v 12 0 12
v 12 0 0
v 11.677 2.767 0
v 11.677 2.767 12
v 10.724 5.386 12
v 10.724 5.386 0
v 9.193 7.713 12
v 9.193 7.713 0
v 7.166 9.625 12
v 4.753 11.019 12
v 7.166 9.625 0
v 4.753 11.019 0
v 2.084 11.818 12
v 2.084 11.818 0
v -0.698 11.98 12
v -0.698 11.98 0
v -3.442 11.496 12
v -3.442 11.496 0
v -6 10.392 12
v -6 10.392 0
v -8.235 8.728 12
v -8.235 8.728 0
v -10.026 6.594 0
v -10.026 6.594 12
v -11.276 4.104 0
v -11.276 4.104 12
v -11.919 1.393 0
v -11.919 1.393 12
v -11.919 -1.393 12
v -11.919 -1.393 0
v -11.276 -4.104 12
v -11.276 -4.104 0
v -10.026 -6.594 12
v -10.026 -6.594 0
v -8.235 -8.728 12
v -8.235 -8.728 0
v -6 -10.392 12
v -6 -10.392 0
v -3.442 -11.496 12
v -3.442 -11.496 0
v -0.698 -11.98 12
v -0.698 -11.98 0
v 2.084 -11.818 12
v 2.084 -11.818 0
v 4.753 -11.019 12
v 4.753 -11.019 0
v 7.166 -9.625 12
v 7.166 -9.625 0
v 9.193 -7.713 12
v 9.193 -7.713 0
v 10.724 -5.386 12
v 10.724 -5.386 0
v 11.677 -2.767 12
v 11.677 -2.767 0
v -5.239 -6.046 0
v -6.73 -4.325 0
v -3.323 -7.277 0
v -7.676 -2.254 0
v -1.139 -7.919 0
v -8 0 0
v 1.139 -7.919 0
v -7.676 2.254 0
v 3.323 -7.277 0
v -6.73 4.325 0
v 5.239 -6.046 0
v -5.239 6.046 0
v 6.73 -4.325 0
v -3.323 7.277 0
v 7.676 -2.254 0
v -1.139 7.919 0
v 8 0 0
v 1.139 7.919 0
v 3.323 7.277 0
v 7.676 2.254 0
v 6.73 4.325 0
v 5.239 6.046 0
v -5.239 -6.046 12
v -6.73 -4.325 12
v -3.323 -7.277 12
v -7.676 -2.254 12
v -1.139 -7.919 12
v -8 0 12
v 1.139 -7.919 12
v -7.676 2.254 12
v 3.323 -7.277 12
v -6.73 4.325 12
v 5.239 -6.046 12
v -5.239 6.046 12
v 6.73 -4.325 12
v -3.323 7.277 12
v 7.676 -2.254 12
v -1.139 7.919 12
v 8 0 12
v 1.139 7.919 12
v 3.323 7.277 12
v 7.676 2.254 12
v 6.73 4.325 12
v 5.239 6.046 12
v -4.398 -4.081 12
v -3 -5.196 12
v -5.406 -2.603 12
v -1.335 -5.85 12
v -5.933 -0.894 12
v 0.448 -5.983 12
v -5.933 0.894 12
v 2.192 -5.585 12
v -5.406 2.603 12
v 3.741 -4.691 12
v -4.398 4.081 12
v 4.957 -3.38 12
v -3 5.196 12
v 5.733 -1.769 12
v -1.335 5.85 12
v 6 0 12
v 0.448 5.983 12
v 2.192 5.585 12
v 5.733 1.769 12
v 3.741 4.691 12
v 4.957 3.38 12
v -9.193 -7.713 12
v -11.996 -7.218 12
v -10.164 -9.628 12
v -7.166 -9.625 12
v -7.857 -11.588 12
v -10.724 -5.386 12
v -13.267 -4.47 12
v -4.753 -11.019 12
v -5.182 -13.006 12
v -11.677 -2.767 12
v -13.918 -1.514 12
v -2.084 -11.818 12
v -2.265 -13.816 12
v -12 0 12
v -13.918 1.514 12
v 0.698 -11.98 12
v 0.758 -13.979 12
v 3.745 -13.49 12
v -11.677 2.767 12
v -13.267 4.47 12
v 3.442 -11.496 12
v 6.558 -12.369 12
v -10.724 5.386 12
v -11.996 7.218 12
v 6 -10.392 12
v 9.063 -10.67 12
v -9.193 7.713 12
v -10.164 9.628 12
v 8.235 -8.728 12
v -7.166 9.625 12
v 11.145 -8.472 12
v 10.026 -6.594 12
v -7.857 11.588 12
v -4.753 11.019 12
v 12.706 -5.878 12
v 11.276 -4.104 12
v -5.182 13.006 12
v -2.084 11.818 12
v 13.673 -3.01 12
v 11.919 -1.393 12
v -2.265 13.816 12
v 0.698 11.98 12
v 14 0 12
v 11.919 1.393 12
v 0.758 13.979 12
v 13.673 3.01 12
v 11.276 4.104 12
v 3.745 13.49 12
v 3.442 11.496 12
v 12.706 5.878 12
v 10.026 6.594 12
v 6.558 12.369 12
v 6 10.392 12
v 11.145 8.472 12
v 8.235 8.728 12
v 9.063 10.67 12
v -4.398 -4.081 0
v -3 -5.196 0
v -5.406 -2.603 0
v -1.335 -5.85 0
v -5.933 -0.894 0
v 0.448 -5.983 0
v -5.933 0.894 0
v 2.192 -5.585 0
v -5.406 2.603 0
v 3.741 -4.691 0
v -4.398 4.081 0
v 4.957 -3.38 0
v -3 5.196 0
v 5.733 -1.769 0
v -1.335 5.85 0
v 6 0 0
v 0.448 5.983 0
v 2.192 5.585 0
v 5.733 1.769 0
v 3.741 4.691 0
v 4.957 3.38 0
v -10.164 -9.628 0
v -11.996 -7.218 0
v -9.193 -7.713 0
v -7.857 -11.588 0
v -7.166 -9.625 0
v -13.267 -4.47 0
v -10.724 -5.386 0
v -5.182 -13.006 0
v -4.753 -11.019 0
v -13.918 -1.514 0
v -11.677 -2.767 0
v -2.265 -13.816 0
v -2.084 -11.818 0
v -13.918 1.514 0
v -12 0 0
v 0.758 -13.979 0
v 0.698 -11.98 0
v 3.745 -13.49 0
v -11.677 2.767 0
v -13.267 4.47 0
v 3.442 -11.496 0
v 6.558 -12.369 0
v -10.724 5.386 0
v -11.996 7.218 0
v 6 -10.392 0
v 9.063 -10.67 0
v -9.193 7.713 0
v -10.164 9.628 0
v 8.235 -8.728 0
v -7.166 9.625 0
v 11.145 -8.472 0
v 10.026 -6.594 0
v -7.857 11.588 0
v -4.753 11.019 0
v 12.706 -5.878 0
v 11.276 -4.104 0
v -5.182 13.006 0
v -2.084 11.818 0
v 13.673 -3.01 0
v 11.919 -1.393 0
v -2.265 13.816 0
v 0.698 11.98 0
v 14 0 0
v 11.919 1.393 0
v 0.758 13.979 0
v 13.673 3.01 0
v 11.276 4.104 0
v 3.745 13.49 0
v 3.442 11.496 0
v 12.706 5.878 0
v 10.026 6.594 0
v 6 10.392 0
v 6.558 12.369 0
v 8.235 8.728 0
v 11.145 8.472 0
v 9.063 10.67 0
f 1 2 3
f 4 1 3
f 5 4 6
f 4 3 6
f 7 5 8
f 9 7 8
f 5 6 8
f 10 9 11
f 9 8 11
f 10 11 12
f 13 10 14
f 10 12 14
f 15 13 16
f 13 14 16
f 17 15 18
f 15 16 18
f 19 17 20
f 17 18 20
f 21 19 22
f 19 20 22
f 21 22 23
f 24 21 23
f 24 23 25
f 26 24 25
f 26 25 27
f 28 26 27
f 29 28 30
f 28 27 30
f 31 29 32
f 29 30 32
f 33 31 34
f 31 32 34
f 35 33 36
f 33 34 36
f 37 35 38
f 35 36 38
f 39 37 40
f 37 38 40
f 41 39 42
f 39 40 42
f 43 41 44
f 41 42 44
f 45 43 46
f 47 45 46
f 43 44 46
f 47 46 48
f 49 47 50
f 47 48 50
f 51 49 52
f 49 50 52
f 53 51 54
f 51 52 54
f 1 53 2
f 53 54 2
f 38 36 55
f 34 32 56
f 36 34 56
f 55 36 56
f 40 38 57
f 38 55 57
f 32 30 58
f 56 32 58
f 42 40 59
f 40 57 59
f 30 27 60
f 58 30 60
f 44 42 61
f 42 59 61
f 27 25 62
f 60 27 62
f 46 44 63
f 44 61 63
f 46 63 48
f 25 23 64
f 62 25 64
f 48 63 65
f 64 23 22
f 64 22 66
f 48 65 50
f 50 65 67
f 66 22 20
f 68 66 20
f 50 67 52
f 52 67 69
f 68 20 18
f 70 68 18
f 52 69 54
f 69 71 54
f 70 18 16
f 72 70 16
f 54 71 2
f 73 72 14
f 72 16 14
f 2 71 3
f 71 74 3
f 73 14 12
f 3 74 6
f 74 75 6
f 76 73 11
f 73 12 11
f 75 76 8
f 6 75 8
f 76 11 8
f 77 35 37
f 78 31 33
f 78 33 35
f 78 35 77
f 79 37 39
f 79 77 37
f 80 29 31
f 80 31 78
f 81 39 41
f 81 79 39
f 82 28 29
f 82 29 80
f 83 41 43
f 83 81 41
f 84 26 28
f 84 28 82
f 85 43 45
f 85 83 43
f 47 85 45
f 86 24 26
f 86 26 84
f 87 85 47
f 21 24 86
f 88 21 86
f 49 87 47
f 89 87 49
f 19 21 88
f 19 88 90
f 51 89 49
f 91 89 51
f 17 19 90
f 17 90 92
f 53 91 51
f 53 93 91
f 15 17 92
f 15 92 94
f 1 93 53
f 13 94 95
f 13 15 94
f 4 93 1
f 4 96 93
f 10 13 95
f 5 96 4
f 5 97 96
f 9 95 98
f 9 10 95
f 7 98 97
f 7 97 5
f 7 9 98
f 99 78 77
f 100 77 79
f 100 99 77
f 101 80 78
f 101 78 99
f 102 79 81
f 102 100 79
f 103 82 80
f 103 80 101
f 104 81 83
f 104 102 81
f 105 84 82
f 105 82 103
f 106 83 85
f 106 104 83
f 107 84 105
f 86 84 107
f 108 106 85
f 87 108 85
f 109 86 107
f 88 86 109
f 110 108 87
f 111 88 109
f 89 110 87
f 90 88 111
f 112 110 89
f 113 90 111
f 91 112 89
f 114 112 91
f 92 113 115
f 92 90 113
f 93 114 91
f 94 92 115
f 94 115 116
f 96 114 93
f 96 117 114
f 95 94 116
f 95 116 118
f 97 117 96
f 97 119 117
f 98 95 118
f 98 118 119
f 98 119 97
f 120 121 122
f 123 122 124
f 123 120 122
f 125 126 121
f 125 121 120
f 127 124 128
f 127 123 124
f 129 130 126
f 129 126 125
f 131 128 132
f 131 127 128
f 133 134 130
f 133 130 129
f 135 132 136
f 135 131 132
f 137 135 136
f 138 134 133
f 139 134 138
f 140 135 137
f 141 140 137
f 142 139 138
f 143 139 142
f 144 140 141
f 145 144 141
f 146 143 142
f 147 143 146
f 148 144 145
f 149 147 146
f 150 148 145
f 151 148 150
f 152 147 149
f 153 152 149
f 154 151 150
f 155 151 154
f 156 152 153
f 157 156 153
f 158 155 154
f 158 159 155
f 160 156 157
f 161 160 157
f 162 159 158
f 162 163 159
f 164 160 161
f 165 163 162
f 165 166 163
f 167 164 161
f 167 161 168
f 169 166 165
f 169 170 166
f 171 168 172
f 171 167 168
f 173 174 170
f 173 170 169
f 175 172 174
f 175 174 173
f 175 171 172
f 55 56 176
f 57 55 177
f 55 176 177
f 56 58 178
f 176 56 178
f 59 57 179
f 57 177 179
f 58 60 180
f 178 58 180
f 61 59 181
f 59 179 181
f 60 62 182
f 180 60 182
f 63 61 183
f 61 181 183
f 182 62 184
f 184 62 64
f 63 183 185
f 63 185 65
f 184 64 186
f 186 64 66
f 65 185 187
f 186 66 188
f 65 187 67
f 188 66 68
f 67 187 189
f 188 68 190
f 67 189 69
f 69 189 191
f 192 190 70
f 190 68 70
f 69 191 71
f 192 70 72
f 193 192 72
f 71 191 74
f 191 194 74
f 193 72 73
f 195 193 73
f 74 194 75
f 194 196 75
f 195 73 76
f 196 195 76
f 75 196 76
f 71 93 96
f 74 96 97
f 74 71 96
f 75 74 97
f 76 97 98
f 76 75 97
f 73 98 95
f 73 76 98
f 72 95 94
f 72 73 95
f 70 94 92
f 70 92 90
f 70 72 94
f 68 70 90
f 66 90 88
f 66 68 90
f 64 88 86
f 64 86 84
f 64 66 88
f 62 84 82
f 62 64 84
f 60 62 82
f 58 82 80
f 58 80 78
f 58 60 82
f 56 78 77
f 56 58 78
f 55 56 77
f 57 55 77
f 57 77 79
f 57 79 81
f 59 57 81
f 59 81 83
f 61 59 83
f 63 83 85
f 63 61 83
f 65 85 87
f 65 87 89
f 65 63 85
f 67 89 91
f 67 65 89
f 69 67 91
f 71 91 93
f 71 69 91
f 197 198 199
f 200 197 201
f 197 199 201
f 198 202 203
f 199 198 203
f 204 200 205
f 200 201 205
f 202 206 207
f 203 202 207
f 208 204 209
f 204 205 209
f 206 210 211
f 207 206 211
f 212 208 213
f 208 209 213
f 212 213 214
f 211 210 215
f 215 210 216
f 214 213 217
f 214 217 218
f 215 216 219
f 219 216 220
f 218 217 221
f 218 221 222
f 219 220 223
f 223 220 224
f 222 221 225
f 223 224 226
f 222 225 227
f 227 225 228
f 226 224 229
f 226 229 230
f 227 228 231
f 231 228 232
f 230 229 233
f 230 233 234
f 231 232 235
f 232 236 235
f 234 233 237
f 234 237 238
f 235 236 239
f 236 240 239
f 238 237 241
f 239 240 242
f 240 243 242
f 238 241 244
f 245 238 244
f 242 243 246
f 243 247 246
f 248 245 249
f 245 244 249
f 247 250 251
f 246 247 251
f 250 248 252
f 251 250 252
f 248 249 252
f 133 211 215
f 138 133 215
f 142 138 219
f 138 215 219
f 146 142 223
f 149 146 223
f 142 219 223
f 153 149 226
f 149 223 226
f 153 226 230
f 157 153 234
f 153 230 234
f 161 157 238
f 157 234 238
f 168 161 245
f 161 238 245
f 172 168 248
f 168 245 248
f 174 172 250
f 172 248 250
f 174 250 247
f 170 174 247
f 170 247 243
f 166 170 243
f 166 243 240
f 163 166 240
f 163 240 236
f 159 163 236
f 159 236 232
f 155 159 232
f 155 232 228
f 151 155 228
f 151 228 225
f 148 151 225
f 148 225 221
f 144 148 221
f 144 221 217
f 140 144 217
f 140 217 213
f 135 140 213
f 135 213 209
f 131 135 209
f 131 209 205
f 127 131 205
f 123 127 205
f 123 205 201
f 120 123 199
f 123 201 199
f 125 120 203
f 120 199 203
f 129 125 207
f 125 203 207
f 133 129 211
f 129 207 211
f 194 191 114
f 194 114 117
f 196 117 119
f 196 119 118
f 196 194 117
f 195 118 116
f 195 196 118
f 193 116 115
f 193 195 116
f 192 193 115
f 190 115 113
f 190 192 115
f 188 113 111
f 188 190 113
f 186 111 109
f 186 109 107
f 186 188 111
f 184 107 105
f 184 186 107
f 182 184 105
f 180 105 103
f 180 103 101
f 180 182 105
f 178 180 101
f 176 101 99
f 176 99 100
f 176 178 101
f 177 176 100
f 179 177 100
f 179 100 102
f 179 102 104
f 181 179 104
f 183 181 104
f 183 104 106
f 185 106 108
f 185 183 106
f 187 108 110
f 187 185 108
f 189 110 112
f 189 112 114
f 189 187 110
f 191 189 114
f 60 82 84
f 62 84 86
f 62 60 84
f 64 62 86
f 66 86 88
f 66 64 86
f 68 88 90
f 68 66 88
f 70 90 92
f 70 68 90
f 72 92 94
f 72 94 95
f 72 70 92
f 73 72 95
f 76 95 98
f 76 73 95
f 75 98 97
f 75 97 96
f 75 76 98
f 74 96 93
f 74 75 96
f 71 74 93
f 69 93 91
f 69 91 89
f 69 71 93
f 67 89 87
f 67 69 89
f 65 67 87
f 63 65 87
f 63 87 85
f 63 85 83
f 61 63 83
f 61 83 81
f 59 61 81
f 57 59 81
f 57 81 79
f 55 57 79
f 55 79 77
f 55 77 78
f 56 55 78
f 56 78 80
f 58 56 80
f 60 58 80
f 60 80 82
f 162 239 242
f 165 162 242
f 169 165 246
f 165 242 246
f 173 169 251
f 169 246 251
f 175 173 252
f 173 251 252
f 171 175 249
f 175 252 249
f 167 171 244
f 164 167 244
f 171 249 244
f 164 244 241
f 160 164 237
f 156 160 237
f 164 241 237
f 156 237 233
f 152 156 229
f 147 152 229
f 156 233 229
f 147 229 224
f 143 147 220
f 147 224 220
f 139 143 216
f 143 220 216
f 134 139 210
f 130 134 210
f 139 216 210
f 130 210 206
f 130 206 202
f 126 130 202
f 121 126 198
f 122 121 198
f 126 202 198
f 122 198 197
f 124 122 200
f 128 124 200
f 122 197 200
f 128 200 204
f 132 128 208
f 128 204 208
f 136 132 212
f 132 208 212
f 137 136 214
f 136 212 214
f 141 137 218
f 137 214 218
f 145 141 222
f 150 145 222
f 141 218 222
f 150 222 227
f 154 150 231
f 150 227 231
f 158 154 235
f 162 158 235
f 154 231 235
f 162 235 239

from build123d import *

# Parameters (mm, degrees)
SKIZZE1_R                       = 14
SKIZZE1_R_2                     = 6
AUFSATZ_LINEAR_AUSTRAGEN1_DEPTH = 12
SKIZZE2_R                       = 12
SKIZZE2_R_2                     = 8
SCHNITT_LINEAR_AUSTRAGEN2_DEPTH = 24.151673806
SKIZZE3_R                       = 12
SKIZZE3_R_2                     = 8
AUFSATZ_LINEAR_AUSTRAGEN3_DEPTH = 12


with BuildPart() as part:
    # Skizze1 → Aufsatz-Linear austragen1 (new body)
    with BuildSketch(Plane.XY):
        Circle(SKIZZE1_R)
        Circle(SKIZZE1_R_2, mode=Mode.SUBTRACT)
    extrude(amount=AUFSATZ_LINEAR_AUSTRAGEN1_DEPTH)

    # Skizze2 → Schnitt-Linear austragen2 (cut, through all)
    with BuildSketch(Plane(origin=(0, 0, 0), x_dir=(-1, 0, 0), z_dir=(0, 0, -1))):
        Circle(SKIZZE2_R)
        Circle(SKIZZE2_R_2, mode=Mode.SUBTRACT)
    extrude(amount=-SCHNITT_LINEAR_AUSTRAGEN2_DEPTH, mode=Mode.SUBTRACT)


with BuildPart() as schnitt_linear_austragen2_piece_1:
    # of the separate pieces the step leaves, piece 1, a body of its own (schnitt_linear_austragen2_pieces)
    add(part.part.solids().sort_by_distance((14, 0, 0))[0])


with BuildPart() as schnitt_linear_austragen2_piece_2:
    # of the separate pieces the step leaves, piece 2, a body of its own (schnitt_linear_austragen2_pieces)
    add(part.part.solids().sort_by_distance((-8, 0, 0))[0])


with BuildPart() as body_3:
    # Skizze3 → Aufsatz-Linear austragen3 (new body)
    with BuildSketch(Plane.XY):
        Circle(SKIZZE3_R)
        Circle(SKIZZE3_R_2, mode=Mode.SUBTRACT)
    extrude(amount=AUFSATZ_LINEAR_AUSTRAGEN3_DEPTH)


solid = Compound([schnitt_linear_austragen2_piece_1.part, schnitt_linear_austragen2_piece_2.part, body_3.part])
